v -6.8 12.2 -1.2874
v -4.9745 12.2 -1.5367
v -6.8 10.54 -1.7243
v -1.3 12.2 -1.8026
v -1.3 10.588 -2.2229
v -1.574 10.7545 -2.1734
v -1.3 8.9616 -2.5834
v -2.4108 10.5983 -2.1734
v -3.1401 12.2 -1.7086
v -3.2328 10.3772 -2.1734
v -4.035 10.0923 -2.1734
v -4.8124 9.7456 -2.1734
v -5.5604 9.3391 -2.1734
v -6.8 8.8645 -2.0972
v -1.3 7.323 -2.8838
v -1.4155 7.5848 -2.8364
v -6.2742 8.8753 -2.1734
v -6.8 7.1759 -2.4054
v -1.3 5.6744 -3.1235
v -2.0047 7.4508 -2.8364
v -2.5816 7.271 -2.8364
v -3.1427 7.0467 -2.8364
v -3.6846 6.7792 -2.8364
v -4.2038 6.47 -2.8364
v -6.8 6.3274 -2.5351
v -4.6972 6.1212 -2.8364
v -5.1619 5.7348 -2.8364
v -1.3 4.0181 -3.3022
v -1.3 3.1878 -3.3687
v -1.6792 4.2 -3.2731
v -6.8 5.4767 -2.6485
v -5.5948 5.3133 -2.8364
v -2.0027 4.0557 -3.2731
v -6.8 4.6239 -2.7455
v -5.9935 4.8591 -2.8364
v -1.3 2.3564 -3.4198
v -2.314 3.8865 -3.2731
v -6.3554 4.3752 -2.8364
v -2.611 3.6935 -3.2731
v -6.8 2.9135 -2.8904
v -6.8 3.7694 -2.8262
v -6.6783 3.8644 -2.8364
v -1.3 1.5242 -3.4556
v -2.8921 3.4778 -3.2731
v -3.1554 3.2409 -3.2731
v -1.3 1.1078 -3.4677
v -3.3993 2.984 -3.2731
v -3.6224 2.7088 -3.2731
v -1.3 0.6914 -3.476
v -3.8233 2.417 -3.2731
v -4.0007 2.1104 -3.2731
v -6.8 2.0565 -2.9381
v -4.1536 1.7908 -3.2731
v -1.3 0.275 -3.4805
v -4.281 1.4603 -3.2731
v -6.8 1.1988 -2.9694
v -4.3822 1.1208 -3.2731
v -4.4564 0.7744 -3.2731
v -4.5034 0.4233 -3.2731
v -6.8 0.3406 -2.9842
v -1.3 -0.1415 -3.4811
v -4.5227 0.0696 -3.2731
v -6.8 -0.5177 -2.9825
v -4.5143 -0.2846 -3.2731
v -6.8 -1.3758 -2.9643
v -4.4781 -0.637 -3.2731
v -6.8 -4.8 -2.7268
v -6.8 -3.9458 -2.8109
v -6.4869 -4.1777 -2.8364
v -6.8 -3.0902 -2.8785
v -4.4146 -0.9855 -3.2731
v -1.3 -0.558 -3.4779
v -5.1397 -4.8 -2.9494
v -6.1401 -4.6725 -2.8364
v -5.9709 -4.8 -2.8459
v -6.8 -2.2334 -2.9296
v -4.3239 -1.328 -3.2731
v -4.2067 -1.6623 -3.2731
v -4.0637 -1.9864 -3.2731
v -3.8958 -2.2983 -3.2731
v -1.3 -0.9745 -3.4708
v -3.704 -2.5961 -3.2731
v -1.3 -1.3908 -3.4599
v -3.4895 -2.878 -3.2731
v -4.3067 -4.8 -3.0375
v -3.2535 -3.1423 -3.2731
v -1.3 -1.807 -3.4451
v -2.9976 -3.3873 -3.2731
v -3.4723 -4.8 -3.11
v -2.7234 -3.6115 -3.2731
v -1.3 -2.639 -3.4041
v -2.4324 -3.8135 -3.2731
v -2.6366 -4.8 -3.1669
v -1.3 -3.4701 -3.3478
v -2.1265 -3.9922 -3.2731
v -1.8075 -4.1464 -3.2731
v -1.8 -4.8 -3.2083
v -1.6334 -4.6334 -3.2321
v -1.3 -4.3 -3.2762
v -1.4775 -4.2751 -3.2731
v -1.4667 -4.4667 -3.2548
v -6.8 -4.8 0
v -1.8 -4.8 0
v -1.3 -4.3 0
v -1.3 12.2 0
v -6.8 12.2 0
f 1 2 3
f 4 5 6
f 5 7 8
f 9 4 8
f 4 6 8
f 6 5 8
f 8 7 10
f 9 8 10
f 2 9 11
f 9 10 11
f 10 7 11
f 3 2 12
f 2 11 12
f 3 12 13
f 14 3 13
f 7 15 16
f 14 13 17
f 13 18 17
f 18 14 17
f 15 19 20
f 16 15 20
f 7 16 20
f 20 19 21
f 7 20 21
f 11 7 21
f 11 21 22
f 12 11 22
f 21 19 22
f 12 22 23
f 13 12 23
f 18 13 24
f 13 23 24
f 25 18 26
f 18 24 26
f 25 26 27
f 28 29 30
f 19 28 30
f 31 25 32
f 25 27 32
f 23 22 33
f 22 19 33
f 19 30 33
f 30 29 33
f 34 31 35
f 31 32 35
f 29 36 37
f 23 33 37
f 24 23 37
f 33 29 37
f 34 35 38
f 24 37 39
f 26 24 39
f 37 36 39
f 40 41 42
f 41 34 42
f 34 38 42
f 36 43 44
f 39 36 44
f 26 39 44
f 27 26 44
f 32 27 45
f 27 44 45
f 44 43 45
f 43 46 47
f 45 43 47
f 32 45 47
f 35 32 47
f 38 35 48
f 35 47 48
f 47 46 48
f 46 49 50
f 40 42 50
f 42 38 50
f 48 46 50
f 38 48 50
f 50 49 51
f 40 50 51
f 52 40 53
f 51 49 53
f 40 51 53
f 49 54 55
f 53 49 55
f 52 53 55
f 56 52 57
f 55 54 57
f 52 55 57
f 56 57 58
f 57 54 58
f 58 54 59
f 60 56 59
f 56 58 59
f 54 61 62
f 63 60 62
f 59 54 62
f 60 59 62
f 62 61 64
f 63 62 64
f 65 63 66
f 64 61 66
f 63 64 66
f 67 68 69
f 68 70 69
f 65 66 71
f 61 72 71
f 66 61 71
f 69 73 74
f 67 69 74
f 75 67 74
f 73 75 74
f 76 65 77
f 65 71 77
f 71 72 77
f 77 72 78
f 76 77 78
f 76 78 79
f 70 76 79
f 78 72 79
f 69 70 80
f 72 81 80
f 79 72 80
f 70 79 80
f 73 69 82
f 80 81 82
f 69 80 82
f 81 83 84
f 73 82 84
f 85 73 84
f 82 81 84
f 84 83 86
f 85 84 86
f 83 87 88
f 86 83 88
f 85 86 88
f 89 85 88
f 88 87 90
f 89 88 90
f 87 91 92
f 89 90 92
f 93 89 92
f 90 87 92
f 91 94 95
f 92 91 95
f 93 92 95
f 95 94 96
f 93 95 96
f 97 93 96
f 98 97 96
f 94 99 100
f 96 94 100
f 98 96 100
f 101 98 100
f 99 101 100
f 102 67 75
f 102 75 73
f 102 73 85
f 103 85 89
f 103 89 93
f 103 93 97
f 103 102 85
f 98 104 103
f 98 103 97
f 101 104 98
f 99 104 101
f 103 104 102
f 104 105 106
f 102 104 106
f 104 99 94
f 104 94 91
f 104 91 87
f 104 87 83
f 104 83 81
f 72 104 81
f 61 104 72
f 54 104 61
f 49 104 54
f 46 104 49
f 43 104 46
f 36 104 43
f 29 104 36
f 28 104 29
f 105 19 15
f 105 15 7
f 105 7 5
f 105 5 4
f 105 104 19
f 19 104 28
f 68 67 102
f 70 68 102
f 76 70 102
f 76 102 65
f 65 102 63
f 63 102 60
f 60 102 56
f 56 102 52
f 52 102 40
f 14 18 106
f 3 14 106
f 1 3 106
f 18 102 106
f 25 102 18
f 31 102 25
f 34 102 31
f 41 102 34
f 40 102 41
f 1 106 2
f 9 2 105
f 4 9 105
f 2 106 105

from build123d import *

# Parameters (mm, degrees)
SKETCH_2_OUTSIDE_W   = 37.95
SKETCH_2_OUTSIDE_H   = 37.95
SKETCH_2_OUTSIDE_W_2 = 5.5
SKETCH_2_OUTSIDE_H_2 = 17
CUT_EXTRUDE_1_DEPTH  = 4.5
CHAMFER_3_SIZE       = 0.5


with BuildPart() as part:
    # Эскиз1 → Повернуть1 (revolve)
    with BuildSketch(Plane(origin=(0, 0, 0), x_dir=(1, 0, 0), z_dir=(0, 1, 0))):
        with BuildLine():
            Line((14, 0), (14, 1.276685932))
            ThreePointArc((14, 1.276685932), (7.087720463, 2.940710488), (0, 3.5))
            Line((0, 3.5), (0, 0))
            Line((0, 0), (14, 0))
        make_face()
    revolve(axis=Axis((0, 0, -3.5), (0, 0, 1)))

    # Эскиз2 outside → Вырез-Вытянуть1 (cut, through all)
    with BuildSketch(Plane.XY):
        Rectangle(SKETCH_2_OUTSIDE_W, SKETCH_2_OUTSIDE_H)
        with Locations((-4.05, 3.7)):
            Rectangle(SKETCH_2_OUTSIDE_W_2, SKETCH_2_OUTSIDE_H_2, mode=Mode.SUBTRACT)
    extrude(amount=-CUT_EXTRUDE_1_DEPTH, mode=Mode.SUBTRACT)

    # Фаска3
    chamfer_3_edges = [part.edges().sort_by_distance(p)[0] for p in [
        (-1.3, -4.8, -1.61277204),
    ]]
    chamfer(chamfer_3_edges, length=CHAMFER_3_SIZE)


solid = part.part
